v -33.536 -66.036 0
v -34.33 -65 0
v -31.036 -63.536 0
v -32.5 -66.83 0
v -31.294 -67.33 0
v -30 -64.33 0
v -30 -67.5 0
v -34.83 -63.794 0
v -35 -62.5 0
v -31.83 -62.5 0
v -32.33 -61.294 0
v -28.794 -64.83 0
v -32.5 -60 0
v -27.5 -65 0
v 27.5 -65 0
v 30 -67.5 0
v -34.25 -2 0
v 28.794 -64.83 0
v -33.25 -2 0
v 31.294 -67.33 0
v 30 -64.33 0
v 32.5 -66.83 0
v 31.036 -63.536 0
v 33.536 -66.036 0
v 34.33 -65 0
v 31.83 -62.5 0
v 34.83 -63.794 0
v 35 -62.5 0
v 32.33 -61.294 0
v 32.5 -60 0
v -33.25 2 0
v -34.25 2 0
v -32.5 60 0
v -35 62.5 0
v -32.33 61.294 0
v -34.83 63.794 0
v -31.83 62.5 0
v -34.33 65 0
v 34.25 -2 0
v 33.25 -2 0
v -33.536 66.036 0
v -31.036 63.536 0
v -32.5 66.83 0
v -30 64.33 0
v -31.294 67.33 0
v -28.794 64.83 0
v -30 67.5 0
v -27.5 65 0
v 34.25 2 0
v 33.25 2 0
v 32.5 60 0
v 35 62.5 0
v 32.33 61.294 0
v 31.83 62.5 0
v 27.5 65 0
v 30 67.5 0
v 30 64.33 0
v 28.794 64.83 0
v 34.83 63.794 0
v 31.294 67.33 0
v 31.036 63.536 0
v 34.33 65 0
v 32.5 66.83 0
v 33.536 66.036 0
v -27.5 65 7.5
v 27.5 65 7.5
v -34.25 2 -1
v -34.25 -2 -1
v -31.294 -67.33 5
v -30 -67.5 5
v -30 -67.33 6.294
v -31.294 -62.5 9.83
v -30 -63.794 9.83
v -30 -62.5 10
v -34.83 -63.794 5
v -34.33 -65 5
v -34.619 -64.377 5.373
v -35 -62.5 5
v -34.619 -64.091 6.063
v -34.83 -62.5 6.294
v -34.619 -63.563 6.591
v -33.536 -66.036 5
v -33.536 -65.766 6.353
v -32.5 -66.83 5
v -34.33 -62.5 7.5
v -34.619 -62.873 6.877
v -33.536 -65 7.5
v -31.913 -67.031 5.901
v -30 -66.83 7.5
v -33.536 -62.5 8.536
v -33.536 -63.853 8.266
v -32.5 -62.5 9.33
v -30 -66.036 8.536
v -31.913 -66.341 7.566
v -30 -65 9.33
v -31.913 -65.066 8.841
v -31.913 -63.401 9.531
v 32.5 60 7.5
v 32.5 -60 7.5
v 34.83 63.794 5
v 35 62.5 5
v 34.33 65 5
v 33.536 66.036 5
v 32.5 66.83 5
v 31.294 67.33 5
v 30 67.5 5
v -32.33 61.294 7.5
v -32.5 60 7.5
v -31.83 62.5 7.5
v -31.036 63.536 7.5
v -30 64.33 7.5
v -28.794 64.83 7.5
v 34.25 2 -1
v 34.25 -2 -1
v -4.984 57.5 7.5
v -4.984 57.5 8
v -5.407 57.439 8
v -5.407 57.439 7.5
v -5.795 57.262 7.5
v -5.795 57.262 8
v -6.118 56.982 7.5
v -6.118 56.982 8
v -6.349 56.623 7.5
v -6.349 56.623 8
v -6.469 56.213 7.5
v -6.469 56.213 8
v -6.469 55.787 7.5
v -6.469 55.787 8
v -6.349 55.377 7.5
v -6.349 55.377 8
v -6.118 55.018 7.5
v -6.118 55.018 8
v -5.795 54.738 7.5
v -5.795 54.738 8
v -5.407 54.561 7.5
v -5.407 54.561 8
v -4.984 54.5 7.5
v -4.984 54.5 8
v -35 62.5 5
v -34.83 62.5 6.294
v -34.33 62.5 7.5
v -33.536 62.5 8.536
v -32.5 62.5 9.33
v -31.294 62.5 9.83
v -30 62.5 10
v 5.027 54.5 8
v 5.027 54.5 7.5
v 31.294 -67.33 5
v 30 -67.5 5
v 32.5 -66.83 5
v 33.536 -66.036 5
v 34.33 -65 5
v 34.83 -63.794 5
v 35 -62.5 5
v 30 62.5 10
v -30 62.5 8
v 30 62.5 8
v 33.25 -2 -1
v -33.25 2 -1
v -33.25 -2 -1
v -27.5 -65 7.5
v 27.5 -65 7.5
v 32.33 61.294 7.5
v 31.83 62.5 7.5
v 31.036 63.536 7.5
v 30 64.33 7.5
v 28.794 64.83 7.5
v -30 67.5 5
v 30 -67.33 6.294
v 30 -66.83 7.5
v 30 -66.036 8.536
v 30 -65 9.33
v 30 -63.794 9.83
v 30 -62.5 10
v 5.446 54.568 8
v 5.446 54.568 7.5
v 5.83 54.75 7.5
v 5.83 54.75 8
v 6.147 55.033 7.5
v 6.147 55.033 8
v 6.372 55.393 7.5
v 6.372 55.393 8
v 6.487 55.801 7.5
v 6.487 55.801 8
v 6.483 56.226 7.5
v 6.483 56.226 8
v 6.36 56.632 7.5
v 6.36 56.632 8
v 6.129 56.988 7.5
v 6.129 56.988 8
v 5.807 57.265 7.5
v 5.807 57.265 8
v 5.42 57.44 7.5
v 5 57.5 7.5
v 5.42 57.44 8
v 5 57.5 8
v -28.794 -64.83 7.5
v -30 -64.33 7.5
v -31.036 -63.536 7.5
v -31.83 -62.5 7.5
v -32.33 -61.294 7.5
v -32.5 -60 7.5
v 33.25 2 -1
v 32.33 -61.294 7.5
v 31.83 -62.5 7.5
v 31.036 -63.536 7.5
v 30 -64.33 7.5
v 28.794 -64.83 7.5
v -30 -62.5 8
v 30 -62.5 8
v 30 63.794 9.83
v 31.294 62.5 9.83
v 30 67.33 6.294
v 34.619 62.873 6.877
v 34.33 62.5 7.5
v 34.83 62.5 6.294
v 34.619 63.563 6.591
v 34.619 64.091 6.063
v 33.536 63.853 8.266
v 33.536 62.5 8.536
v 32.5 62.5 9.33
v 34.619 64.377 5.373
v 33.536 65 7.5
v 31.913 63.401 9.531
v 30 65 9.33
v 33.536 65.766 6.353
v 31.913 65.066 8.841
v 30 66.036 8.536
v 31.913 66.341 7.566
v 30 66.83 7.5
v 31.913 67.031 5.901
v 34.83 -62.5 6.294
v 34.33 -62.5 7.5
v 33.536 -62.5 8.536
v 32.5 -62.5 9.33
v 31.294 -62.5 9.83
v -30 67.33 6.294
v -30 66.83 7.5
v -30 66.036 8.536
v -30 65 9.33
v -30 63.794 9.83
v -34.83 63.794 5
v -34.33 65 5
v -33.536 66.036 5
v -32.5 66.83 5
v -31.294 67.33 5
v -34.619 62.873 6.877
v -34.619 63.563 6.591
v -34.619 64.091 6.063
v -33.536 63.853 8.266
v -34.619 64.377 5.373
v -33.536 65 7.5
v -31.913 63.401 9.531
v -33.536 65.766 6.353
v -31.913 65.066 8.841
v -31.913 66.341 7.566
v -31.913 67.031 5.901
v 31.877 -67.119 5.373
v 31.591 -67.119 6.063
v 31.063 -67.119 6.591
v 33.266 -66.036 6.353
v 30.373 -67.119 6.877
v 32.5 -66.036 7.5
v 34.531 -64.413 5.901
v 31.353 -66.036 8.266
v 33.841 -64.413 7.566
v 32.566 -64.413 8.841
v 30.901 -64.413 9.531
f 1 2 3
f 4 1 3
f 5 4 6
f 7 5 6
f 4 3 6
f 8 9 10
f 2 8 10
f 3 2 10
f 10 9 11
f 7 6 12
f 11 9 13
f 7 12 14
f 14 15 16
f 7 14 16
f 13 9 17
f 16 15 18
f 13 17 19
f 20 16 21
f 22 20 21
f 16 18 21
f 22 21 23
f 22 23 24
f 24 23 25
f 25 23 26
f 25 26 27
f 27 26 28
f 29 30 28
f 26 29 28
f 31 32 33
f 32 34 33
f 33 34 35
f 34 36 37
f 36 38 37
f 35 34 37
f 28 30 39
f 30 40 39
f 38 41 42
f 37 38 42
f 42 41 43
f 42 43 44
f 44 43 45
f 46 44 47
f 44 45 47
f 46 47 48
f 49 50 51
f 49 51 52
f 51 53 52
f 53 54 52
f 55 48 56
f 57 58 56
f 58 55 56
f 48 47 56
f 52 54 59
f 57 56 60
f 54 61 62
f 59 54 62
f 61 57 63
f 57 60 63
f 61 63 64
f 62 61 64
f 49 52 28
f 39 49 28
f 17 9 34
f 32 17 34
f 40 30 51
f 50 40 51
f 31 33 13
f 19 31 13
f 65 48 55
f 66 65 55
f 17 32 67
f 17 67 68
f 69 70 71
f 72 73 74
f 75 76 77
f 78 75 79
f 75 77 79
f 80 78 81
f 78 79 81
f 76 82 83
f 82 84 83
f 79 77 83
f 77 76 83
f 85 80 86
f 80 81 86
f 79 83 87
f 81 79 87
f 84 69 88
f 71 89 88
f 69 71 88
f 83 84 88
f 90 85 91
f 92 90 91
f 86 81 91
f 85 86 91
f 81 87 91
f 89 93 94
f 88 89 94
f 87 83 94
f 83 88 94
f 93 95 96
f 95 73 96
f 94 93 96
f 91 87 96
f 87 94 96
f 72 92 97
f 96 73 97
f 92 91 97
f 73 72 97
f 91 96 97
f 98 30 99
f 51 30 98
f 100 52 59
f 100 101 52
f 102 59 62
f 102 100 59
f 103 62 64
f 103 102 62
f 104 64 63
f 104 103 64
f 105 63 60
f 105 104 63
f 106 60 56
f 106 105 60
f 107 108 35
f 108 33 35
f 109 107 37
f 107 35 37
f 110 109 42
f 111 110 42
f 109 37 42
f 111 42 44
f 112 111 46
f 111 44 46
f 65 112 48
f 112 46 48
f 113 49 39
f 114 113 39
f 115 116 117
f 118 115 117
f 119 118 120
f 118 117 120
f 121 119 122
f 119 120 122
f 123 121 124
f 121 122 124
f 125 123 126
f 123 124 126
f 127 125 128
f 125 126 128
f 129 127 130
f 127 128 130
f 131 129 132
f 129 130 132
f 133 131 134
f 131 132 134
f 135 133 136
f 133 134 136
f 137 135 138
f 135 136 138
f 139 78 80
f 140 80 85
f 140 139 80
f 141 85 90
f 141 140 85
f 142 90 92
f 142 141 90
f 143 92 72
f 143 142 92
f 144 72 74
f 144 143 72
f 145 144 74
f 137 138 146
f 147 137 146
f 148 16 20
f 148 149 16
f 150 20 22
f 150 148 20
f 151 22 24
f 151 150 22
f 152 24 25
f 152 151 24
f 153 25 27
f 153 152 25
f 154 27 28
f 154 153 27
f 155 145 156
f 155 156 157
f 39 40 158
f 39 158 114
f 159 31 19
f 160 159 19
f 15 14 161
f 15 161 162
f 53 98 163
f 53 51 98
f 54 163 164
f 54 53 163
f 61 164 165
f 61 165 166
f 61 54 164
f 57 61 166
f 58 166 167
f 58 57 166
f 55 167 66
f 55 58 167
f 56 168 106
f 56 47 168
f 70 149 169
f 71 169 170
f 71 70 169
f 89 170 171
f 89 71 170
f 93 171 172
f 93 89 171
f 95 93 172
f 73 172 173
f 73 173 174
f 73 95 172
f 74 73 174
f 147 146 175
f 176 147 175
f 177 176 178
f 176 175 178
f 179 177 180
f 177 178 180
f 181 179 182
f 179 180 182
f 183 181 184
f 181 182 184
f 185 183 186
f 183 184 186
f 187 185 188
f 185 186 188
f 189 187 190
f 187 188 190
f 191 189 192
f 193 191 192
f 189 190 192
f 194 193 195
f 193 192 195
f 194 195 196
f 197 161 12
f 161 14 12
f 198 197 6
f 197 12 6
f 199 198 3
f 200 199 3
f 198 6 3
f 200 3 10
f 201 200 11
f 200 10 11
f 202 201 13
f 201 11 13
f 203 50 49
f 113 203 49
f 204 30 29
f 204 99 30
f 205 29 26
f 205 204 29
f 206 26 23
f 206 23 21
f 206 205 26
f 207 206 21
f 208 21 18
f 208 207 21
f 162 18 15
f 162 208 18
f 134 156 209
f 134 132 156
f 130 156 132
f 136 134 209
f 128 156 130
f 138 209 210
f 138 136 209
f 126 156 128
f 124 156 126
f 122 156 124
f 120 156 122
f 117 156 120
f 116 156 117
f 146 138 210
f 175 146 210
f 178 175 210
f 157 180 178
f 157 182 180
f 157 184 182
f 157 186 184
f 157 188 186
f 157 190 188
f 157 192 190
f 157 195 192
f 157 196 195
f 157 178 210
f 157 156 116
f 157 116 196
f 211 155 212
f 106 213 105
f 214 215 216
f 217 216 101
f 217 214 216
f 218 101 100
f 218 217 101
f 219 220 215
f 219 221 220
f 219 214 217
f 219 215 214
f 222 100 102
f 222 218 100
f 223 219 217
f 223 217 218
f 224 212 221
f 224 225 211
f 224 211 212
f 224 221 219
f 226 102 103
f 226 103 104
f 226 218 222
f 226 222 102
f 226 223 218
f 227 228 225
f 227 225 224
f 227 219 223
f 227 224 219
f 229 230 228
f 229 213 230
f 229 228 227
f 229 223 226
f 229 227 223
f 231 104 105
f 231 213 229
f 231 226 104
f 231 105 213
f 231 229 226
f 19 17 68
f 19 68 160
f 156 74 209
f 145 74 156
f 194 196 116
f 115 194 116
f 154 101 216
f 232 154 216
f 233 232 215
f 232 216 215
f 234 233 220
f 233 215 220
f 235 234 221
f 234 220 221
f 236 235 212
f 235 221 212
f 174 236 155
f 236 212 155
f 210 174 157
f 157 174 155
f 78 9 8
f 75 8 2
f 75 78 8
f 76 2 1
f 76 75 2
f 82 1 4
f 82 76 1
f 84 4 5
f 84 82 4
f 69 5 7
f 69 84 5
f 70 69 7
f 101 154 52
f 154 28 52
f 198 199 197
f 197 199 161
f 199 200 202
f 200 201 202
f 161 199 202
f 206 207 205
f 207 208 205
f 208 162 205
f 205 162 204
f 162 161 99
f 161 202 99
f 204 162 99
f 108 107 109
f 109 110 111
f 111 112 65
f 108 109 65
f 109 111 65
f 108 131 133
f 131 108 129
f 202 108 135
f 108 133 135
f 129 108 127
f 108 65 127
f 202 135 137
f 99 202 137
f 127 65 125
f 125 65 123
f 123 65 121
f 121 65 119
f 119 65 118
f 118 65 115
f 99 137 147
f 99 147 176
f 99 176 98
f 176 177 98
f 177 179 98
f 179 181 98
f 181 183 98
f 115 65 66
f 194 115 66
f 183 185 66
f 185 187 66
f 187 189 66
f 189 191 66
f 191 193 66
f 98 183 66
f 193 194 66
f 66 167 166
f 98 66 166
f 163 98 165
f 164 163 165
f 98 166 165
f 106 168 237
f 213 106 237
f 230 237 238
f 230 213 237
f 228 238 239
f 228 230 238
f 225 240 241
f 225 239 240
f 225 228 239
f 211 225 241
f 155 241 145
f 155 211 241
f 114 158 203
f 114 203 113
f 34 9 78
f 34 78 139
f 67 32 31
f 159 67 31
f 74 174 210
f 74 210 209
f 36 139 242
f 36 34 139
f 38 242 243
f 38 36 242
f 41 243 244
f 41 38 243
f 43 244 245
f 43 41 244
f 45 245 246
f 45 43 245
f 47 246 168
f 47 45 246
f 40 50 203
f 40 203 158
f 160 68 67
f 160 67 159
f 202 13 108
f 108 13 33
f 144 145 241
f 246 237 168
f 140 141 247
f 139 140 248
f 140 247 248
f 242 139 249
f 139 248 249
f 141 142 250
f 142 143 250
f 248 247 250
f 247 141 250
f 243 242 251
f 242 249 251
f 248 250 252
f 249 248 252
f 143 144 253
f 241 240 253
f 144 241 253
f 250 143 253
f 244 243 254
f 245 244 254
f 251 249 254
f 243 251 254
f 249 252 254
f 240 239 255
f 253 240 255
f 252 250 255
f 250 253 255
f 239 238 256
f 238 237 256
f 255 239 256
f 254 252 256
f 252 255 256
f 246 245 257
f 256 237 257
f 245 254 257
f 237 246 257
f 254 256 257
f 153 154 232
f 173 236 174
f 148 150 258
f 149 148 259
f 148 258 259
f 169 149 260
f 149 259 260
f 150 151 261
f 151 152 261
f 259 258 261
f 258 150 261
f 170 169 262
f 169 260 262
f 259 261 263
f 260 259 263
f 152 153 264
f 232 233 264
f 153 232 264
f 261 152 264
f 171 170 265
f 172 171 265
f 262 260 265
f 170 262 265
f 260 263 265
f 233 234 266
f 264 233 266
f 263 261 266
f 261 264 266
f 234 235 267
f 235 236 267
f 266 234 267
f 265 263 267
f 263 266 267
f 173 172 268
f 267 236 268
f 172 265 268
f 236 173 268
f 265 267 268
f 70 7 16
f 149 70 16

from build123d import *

# Parameters (mm, degrees)
F0_W      = 70
F0_H      = 135
F1_DEPTH  = 10
F2_T      = -2.5
F3_R      = 5
F4_R      = 5
F5_R      = 5
F6_R      = 5
F7_W      = 1
F7_H      = 4
F8_DEPTH  = 1
F9_DEPTH  = 2
F11_DEPTH = 1


with BuildPart() as f1:
    # F0 (on Top) → F1 (new body)
    with BuildSketch(Plane.XY):
        Rectangle(F0_W, F0_H)
    extrude(amount=F1_DEPTH)

    # F2
    f2_openings = [f1.faces().sort_by_distance(p)[0] for p in [
        (0, 0, 0),
    ]]
    offset(amount=F2_T, openings=f2_openings)

    # F3
    f3_edges = [f1.edges().sort_by_distance(p)[0] for p in [
        (0, 67.5, 10),
        (35, 0, 10),
        (35, 67.5, 5),
    ]]
    fillet(f3_edges, radius=F3_R)

    # F4
    f4_edges = [f1.edges().sort_by_distance(p)[0] for p in [
        (33.535534, -67.5, 8.535534),
        (-2.5, -67.5, 10),
    ]]
    fillet(f4_edges, radius=F4_R)

    # F5
    f5_edges = [f1.edges().sort_by_distance(p)[0] for p in [
        (-35, 0, 10),
        (-35, -66.035534, 8.535534),
    ]]
    fillet(f5_edges, radius=F5_R)

    # F6
    f6_edges = [f1.edges().sort_by_distance(p)[0] for p in [
        (32.5, 65, 3.75),
        (-32.5, 65, 3.75),
        (32.5, -65, 3.75),
        (-32.5, -65, 3.75),
    ]]
    fillet(f6_edges, radius=F6_R)

    # F7 (on face) → F8 (join)
    with BuildSketch(Plane(origin=(0, 0, 0), x_dir=(1, 0, 0), z_dir=(0, 0, -1))):
        with Locations((-33.75, 0)):
            Rectangle(F7_W, F7_H)
        with Locations((33.75, 0)):
            Rectangle(F7_W, F7_H)
    extrude(amount=F8_DEPTH)

    # F9 (cut): a face of the model
    f9_faces = [f1.faces().sort_by_distance(p)[0] for p in [
        (0, 0, 10),
    ]]
    extrude(f9_faces, amount=-F9_DEPTH, mode=Mode.SUBTRACT)

    # F10 (on face) → F11 (cut)
    with BuildSketch(Plane.XY.offset(8)):
        with BuildLine():
            Line((5, 57.5), (0, 57.5))
            Line((0, 57.5), (-4.9842596054, 57.5))
            ThreePointArc((-4.9842596054, 57.5), (-6.4842596054, 56), (-4.9842596054, 54.5))
            Line((-4.9842596054, 54.5), (5.0273956731, 54.5))
            ThreePointArc((5.0273956731, 54.5), (6.5000625423, 56.0135733205), (5, 57.5))
        make_face()
    extrude(amount=-F11_DEPTH, mode=Mode.SUBTRACT)


solid = f1.part
